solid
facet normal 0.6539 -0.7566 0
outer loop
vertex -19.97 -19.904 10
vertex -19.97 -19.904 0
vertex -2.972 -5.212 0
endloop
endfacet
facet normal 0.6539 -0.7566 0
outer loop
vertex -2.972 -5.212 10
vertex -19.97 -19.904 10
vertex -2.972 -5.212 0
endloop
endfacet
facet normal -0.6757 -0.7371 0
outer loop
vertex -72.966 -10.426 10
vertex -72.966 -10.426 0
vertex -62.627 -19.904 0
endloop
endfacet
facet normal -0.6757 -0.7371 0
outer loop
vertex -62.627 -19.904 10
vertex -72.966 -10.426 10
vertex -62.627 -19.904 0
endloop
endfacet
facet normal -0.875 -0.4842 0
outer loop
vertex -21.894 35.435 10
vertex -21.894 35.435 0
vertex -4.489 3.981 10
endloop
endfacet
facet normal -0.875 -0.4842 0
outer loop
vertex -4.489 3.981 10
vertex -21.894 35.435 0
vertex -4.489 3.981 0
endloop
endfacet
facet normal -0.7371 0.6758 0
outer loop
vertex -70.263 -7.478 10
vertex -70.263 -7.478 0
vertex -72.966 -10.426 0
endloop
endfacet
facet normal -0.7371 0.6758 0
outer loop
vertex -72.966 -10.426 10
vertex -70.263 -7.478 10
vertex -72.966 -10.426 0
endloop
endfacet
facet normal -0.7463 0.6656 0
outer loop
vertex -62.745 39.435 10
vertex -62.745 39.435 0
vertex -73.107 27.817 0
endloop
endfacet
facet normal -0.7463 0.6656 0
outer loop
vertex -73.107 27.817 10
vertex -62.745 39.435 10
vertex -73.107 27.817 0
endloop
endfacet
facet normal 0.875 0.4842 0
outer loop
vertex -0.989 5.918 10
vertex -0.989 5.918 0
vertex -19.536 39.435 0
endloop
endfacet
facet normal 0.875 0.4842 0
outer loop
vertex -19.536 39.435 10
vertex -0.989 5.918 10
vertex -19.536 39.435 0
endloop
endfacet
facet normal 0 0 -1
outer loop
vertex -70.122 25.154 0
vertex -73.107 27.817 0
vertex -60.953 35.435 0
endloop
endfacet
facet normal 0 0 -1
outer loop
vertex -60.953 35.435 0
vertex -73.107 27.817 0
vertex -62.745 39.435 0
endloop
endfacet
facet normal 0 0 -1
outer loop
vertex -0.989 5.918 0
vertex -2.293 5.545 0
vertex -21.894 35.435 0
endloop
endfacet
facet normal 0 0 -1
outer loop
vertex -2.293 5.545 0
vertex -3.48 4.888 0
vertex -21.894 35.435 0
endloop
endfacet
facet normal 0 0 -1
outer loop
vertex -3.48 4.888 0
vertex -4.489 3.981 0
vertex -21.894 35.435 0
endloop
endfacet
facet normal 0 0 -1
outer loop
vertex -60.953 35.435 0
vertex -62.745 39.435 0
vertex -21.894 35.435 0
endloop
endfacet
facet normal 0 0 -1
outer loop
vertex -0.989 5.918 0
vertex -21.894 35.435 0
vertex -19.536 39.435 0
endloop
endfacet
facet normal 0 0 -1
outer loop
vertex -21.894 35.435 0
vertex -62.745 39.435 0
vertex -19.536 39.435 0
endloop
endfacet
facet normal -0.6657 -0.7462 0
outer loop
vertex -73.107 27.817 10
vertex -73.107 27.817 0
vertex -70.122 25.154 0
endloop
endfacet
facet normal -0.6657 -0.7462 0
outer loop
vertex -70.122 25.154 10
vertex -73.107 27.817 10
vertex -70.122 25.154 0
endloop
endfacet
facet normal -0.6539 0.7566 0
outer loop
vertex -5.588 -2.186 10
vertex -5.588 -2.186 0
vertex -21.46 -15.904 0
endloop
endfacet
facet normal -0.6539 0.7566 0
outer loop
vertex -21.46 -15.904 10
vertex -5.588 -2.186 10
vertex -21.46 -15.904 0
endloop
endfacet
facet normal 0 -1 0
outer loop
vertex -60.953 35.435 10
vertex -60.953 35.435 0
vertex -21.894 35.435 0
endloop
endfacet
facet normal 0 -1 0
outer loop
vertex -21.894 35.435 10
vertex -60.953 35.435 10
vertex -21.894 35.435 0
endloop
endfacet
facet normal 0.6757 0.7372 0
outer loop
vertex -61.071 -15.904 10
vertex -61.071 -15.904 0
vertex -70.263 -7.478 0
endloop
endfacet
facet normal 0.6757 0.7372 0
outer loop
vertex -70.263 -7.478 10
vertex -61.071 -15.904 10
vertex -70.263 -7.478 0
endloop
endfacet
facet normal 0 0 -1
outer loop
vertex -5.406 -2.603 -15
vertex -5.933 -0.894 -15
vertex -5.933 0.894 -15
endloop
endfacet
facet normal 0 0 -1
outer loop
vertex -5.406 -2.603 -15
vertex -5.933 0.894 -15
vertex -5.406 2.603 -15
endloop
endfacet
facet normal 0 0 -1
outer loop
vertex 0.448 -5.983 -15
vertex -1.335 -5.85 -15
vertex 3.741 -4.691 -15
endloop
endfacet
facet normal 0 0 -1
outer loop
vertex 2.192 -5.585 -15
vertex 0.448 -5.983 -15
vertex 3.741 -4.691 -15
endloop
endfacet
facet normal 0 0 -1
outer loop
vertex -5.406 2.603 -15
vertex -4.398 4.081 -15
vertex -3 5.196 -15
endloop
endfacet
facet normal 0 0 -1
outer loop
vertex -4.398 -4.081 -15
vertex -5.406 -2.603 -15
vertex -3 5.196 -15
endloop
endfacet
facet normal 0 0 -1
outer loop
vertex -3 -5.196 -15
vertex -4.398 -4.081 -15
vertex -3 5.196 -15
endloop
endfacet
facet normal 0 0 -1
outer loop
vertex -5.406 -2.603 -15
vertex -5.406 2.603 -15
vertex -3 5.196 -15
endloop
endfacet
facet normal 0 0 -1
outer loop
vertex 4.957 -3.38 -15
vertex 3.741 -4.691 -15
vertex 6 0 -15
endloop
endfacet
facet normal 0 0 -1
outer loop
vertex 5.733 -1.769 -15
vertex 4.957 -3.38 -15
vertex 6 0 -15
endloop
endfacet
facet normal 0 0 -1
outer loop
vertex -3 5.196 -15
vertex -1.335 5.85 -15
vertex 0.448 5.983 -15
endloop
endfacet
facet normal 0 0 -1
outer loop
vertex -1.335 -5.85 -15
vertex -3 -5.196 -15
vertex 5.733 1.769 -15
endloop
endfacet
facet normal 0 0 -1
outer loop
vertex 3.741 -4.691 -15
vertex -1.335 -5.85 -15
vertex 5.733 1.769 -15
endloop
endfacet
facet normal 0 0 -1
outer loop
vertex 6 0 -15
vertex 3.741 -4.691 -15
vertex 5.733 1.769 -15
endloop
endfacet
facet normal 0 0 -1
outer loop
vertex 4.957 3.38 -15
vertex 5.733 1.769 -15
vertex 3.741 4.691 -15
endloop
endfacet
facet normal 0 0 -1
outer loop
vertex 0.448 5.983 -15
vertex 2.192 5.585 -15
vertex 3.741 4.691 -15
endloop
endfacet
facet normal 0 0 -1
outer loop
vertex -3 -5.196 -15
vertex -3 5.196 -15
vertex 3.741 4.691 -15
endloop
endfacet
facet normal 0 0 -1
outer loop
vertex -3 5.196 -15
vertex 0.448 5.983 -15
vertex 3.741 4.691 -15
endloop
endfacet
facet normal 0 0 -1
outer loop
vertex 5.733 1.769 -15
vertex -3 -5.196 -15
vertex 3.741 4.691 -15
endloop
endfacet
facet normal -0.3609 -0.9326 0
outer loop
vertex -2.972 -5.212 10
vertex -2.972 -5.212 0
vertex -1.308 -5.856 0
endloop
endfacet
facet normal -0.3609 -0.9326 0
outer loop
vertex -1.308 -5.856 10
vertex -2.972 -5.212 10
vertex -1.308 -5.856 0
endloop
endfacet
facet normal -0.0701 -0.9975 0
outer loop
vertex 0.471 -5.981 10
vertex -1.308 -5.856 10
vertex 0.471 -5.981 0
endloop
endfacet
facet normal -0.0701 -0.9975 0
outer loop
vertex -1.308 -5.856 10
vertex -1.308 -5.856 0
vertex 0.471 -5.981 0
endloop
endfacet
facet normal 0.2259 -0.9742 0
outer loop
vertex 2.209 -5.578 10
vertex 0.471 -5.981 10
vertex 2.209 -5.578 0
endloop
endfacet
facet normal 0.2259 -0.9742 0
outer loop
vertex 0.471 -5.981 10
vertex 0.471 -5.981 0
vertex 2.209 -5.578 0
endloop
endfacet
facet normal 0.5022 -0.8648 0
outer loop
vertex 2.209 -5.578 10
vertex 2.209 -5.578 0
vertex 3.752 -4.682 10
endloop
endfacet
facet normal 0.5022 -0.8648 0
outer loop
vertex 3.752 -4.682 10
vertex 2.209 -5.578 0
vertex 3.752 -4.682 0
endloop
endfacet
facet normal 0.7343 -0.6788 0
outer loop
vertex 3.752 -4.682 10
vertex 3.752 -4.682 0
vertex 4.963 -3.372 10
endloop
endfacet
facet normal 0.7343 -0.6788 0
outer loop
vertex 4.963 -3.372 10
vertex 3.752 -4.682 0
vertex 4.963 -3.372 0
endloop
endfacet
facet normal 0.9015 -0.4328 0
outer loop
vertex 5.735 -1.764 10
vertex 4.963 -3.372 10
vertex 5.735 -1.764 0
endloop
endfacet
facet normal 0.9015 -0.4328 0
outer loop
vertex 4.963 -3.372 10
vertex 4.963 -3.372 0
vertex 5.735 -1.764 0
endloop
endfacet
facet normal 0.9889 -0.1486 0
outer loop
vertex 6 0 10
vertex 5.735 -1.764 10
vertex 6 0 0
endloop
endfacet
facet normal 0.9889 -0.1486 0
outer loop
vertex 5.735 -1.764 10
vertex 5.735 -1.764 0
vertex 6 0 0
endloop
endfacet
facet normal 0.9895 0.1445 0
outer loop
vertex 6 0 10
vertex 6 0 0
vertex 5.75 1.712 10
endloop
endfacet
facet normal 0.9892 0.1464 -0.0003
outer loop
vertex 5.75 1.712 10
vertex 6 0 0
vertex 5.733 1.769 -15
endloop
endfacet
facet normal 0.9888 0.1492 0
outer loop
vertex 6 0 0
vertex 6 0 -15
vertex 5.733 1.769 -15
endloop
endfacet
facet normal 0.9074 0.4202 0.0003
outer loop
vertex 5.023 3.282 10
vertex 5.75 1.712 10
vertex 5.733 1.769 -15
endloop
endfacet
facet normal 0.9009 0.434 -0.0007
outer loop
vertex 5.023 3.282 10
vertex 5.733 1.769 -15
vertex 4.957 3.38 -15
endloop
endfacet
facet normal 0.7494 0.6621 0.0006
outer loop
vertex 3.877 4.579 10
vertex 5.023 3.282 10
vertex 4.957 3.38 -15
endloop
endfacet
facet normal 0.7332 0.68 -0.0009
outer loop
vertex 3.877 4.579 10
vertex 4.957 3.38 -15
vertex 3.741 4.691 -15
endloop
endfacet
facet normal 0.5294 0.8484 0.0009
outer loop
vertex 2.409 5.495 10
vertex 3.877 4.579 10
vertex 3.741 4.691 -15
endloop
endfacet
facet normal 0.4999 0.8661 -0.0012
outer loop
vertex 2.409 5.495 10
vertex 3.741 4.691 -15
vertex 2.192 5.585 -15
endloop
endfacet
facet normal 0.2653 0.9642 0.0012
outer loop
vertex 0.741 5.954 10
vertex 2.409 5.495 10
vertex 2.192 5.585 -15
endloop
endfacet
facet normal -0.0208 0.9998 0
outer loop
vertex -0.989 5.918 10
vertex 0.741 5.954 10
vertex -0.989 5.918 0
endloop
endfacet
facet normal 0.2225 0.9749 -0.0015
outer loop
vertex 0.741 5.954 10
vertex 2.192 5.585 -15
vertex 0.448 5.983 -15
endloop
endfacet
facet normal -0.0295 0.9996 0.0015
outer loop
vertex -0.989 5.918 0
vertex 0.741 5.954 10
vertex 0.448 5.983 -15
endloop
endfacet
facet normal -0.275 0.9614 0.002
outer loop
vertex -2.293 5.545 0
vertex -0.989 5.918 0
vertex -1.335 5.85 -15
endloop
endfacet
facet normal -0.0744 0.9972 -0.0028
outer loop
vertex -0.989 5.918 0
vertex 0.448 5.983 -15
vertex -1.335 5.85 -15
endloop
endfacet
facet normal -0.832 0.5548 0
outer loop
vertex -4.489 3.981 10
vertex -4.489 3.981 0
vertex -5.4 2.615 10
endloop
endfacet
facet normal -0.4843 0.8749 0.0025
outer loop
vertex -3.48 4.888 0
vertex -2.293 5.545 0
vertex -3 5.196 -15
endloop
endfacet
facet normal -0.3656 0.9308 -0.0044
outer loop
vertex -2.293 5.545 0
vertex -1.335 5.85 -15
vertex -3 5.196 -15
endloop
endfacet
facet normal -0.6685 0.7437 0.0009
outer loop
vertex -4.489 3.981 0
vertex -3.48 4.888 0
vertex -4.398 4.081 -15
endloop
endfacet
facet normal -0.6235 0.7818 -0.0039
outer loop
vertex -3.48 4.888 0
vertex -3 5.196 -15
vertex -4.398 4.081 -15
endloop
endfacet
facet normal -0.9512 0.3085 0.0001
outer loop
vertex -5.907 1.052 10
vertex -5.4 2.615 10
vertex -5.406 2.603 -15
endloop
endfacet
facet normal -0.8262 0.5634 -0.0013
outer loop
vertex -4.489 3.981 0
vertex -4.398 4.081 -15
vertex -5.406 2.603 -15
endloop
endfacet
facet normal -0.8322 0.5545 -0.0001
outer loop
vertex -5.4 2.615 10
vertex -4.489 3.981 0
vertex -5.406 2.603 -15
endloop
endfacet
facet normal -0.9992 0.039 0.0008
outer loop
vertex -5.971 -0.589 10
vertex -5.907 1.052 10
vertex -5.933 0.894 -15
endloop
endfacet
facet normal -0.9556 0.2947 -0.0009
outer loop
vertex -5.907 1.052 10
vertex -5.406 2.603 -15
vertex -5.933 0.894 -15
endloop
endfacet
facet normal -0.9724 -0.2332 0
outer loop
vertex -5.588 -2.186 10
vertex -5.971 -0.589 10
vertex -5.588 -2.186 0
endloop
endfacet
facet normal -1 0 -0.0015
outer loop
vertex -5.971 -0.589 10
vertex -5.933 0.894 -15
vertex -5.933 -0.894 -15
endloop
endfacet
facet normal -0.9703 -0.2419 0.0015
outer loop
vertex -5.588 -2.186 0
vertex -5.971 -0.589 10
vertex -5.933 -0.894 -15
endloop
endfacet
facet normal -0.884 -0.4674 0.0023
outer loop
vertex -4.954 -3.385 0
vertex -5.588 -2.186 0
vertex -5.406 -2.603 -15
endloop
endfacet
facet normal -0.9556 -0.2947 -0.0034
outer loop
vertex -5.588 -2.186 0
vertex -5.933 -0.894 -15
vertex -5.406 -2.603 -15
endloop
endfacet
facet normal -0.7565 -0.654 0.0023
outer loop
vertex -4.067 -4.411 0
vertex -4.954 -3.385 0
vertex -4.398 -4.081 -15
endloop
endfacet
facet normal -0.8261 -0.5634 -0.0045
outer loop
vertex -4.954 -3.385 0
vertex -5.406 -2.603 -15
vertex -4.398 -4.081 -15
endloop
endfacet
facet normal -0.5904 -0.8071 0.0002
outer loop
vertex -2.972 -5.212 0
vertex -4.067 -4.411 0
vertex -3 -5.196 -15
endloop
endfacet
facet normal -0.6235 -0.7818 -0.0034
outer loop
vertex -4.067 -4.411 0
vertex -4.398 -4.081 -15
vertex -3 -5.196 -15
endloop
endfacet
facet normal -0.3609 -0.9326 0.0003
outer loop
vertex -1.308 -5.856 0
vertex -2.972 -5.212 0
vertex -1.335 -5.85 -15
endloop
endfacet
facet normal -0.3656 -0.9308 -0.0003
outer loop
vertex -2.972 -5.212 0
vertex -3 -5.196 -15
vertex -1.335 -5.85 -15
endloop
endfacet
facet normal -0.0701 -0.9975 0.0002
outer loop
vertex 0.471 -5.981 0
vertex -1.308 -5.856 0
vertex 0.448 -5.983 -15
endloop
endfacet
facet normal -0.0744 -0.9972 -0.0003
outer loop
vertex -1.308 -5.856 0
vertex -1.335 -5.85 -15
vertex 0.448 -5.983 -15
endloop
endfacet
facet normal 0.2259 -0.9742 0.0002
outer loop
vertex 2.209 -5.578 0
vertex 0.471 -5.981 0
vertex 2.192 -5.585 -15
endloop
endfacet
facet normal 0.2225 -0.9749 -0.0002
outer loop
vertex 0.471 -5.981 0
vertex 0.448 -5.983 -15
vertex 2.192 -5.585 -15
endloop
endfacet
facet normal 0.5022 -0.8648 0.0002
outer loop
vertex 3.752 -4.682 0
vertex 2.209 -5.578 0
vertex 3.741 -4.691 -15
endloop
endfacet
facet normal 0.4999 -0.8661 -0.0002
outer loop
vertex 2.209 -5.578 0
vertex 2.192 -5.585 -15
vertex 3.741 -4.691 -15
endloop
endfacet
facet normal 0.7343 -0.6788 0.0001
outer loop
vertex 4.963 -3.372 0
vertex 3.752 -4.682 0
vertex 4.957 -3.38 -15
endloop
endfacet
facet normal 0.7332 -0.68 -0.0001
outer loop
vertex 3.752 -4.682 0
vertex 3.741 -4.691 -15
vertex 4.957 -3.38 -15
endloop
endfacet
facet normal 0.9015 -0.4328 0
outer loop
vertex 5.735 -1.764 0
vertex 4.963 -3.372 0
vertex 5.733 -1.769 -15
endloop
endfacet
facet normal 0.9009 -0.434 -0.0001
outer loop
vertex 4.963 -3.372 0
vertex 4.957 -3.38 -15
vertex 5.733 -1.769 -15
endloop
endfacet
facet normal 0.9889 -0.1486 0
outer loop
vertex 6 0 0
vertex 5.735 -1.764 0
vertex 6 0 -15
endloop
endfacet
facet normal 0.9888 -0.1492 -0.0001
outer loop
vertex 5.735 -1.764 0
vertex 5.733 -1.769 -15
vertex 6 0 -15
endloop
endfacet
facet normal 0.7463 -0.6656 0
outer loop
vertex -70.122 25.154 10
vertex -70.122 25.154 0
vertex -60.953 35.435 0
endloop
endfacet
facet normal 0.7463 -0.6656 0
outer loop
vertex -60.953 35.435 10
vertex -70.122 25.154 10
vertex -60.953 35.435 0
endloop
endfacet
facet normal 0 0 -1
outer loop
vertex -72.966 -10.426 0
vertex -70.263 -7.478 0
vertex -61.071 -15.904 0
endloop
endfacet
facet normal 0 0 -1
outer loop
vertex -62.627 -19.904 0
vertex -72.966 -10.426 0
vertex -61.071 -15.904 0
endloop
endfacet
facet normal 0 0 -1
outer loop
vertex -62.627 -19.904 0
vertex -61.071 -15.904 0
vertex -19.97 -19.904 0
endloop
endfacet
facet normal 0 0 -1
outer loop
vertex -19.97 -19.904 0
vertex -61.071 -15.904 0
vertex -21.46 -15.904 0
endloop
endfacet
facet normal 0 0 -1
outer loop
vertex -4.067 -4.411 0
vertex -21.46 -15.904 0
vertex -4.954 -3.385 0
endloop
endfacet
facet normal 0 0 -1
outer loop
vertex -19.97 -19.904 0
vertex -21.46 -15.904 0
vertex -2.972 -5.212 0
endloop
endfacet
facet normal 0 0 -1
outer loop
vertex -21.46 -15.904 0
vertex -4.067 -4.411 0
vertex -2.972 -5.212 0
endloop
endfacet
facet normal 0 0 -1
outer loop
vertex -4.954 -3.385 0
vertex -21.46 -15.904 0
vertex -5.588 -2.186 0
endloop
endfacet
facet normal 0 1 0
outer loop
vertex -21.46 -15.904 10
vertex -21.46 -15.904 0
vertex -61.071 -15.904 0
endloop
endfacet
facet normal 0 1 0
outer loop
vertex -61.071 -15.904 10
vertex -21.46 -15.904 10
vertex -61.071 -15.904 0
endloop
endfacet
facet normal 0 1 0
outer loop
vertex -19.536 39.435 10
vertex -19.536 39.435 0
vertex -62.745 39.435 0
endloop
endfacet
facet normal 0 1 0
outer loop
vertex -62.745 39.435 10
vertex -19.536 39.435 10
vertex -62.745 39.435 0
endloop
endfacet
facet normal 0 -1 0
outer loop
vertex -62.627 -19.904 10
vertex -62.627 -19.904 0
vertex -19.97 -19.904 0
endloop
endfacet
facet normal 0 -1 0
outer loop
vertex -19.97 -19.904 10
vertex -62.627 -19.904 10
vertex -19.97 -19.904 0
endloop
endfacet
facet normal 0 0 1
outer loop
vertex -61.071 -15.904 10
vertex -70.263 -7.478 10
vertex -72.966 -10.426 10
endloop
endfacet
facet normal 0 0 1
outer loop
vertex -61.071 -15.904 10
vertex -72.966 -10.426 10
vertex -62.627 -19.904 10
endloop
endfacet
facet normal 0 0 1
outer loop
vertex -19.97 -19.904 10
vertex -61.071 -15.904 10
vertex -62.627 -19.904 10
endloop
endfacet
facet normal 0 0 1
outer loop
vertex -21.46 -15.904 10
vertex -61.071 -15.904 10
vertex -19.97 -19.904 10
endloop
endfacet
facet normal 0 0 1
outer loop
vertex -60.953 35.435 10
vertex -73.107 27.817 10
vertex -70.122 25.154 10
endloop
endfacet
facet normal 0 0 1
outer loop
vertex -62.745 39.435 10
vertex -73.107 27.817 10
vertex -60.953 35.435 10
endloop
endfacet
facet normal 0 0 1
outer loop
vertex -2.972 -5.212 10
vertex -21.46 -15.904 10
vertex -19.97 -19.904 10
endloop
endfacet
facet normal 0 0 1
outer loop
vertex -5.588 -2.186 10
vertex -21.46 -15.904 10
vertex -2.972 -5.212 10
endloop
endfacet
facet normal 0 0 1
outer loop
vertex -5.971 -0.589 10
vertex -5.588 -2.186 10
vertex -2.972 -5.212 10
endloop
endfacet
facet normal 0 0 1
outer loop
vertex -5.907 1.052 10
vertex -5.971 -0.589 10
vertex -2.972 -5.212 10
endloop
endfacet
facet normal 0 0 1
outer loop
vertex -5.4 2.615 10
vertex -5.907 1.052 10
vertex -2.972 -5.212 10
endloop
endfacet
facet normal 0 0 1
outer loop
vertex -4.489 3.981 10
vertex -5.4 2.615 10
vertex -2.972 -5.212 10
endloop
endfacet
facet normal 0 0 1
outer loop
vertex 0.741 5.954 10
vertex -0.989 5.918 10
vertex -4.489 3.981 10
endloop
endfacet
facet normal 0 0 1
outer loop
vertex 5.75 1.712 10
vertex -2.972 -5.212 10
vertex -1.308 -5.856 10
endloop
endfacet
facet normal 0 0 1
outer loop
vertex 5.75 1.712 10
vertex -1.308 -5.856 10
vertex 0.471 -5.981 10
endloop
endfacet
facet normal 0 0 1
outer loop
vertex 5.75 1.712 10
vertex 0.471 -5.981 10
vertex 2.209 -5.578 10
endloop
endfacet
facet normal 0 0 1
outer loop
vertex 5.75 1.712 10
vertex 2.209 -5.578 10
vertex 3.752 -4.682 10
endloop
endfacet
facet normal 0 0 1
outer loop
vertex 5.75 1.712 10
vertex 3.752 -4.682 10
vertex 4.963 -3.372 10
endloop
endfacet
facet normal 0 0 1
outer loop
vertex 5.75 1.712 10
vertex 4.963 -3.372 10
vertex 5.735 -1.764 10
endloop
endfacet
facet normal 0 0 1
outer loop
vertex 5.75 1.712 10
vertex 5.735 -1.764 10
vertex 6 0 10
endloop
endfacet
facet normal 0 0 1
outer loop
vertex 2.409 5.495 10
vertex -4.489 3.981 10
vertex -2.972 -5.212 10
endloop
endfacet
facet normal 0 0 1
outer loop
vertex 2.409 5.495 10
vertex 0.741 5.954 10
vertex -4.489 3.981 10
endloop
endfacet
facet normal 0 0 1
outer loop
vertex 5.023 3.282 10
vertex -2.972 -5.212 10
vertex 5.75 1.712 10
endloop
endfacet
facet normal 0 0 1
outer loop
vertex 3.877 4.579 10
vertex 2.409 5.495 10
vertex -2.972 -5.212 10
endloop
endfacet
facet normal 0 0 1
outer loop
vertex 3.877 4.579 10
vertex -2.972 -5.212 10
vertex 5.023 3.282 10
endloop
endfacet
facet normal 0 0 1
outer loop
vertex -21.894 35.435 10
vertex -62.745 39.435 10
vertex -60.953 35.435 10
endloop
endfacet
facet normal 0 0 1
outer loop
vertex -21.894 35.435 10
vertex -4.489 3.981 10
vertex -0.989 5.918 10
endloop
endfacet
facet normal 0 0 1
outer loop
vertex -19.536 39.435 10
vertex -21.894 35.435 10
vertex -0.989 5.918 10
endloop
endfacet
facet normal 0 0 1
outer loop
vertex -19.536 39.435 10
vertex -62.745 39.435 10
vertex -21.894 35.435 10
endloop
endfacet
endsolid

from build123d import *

# Parameters (mm, degrees)
BOSS_EXTRUDE1_DEPTH = 10
SKETCH2_R           = 6
BOSS_EXTRUDE2_DEPTH = 25


with BuildPart() as part:
    # Sketch1 → Boss-Extrude1 (new body)
    with BuildSketch(Plane.XY):
        with BuildLine():
            ThreePointArc((-4.488845509, 3.981239254), (-2.90504438, 5.249830202), (-0.988958707, 5.917935508))
            Line((-0.988958707, 5.917935508), (-19.535932482, 39.434966685))
            Line((-19.535932482, 39.434966685), (-62.745195449, 39.434966685))
            Line((-62.745195449, 39.434966685), (-73.107309745, 27.816838535))
            Line((-73.107309745, 27.816838535), (-70.122128007, 25.154379147))
            Line((-70.122128007, 25.154379147), (-60.952955338, 35.434966685))
            Line((-60.952955338, 35.434966685), (-21.894070174, 35.434966685))
            Line((-21.894070174, 35.434966685), (-4.488845509, 3.981239254))
        make_face()
        with BuildLine():
            Line((2.535804531, -0.451815201), (-2.972059937, -5.212183777))
            ThreePointArc((-2.972059937, -5.212183777), (3.013937655, -5.188080552), (6, 0))
            ThreePointArc((6, 0), (3.877257262, 4.578960157), (-0.988958707, 5.917935508))
            Line((-0.988958707, 5.917935508), (2.535804531, -0.451815201))
        make_face()
        with BuildLine():
            ThreePointArc((-5.587664835, -2.185864062), (-4.539479574, -3.923407346), (-2.972059937, -5.212183777))
            Line((-2.972059937, -5.212183777), (2.535804531, -0.451815201))
            Line((2.535804531, -0.451815201), (-0.988958707, 5.917935508))
            ThreePointArc((-0.988958707, 5.917935508), (-2.90504438, 5.249830202), (-4.488845509, 3.981239254))
            Line((-4.488845509, 3.981239254), (-2.535804531, 0.451815201))
            Line((-2.535804531, 0.451815201), (-5.587664835, -2.185864062))
        make_face()
        with BuildLine():
            Line((-72.966168133, -10.42614814), (-62.627042774, -19.903679719))
            Line((-62.627042774, -19.903679719), (-19.970484994, -19.903679719))
            Line((-19.970484994, -19.903679719), (-2.972059937, -5.212183777))
            ThreePointArc((-2.972059937, -5.212183777), (-4.539479574, -3.923407346), (-5.587664835, -2.185864062))
            Line((-5.587664835, -2.185864062), (-21.459517662, -15.903679719))
            Line((-21.459517662, -15.903679719), (-61.071108012, -15.903679719))
            Line((-61.071108012, -15.903679719), (-70.263269619, -7.477531579))
            Line((-70.263269619, -7.477531579), (-72.966168133, -10.42614814))
        make_face()
    extrude(amount=BOSS_EXTRUDE1_DEPTH)

    # Sketch2 → Boss-Extrude2 (add)
    with BuildSketch(Plane.XY.offset(10)):
        Circle(SKETCH2_R)
    extrude(amount=-BOSS_EXTRUDE2_DEPTH)


solid = part.part
